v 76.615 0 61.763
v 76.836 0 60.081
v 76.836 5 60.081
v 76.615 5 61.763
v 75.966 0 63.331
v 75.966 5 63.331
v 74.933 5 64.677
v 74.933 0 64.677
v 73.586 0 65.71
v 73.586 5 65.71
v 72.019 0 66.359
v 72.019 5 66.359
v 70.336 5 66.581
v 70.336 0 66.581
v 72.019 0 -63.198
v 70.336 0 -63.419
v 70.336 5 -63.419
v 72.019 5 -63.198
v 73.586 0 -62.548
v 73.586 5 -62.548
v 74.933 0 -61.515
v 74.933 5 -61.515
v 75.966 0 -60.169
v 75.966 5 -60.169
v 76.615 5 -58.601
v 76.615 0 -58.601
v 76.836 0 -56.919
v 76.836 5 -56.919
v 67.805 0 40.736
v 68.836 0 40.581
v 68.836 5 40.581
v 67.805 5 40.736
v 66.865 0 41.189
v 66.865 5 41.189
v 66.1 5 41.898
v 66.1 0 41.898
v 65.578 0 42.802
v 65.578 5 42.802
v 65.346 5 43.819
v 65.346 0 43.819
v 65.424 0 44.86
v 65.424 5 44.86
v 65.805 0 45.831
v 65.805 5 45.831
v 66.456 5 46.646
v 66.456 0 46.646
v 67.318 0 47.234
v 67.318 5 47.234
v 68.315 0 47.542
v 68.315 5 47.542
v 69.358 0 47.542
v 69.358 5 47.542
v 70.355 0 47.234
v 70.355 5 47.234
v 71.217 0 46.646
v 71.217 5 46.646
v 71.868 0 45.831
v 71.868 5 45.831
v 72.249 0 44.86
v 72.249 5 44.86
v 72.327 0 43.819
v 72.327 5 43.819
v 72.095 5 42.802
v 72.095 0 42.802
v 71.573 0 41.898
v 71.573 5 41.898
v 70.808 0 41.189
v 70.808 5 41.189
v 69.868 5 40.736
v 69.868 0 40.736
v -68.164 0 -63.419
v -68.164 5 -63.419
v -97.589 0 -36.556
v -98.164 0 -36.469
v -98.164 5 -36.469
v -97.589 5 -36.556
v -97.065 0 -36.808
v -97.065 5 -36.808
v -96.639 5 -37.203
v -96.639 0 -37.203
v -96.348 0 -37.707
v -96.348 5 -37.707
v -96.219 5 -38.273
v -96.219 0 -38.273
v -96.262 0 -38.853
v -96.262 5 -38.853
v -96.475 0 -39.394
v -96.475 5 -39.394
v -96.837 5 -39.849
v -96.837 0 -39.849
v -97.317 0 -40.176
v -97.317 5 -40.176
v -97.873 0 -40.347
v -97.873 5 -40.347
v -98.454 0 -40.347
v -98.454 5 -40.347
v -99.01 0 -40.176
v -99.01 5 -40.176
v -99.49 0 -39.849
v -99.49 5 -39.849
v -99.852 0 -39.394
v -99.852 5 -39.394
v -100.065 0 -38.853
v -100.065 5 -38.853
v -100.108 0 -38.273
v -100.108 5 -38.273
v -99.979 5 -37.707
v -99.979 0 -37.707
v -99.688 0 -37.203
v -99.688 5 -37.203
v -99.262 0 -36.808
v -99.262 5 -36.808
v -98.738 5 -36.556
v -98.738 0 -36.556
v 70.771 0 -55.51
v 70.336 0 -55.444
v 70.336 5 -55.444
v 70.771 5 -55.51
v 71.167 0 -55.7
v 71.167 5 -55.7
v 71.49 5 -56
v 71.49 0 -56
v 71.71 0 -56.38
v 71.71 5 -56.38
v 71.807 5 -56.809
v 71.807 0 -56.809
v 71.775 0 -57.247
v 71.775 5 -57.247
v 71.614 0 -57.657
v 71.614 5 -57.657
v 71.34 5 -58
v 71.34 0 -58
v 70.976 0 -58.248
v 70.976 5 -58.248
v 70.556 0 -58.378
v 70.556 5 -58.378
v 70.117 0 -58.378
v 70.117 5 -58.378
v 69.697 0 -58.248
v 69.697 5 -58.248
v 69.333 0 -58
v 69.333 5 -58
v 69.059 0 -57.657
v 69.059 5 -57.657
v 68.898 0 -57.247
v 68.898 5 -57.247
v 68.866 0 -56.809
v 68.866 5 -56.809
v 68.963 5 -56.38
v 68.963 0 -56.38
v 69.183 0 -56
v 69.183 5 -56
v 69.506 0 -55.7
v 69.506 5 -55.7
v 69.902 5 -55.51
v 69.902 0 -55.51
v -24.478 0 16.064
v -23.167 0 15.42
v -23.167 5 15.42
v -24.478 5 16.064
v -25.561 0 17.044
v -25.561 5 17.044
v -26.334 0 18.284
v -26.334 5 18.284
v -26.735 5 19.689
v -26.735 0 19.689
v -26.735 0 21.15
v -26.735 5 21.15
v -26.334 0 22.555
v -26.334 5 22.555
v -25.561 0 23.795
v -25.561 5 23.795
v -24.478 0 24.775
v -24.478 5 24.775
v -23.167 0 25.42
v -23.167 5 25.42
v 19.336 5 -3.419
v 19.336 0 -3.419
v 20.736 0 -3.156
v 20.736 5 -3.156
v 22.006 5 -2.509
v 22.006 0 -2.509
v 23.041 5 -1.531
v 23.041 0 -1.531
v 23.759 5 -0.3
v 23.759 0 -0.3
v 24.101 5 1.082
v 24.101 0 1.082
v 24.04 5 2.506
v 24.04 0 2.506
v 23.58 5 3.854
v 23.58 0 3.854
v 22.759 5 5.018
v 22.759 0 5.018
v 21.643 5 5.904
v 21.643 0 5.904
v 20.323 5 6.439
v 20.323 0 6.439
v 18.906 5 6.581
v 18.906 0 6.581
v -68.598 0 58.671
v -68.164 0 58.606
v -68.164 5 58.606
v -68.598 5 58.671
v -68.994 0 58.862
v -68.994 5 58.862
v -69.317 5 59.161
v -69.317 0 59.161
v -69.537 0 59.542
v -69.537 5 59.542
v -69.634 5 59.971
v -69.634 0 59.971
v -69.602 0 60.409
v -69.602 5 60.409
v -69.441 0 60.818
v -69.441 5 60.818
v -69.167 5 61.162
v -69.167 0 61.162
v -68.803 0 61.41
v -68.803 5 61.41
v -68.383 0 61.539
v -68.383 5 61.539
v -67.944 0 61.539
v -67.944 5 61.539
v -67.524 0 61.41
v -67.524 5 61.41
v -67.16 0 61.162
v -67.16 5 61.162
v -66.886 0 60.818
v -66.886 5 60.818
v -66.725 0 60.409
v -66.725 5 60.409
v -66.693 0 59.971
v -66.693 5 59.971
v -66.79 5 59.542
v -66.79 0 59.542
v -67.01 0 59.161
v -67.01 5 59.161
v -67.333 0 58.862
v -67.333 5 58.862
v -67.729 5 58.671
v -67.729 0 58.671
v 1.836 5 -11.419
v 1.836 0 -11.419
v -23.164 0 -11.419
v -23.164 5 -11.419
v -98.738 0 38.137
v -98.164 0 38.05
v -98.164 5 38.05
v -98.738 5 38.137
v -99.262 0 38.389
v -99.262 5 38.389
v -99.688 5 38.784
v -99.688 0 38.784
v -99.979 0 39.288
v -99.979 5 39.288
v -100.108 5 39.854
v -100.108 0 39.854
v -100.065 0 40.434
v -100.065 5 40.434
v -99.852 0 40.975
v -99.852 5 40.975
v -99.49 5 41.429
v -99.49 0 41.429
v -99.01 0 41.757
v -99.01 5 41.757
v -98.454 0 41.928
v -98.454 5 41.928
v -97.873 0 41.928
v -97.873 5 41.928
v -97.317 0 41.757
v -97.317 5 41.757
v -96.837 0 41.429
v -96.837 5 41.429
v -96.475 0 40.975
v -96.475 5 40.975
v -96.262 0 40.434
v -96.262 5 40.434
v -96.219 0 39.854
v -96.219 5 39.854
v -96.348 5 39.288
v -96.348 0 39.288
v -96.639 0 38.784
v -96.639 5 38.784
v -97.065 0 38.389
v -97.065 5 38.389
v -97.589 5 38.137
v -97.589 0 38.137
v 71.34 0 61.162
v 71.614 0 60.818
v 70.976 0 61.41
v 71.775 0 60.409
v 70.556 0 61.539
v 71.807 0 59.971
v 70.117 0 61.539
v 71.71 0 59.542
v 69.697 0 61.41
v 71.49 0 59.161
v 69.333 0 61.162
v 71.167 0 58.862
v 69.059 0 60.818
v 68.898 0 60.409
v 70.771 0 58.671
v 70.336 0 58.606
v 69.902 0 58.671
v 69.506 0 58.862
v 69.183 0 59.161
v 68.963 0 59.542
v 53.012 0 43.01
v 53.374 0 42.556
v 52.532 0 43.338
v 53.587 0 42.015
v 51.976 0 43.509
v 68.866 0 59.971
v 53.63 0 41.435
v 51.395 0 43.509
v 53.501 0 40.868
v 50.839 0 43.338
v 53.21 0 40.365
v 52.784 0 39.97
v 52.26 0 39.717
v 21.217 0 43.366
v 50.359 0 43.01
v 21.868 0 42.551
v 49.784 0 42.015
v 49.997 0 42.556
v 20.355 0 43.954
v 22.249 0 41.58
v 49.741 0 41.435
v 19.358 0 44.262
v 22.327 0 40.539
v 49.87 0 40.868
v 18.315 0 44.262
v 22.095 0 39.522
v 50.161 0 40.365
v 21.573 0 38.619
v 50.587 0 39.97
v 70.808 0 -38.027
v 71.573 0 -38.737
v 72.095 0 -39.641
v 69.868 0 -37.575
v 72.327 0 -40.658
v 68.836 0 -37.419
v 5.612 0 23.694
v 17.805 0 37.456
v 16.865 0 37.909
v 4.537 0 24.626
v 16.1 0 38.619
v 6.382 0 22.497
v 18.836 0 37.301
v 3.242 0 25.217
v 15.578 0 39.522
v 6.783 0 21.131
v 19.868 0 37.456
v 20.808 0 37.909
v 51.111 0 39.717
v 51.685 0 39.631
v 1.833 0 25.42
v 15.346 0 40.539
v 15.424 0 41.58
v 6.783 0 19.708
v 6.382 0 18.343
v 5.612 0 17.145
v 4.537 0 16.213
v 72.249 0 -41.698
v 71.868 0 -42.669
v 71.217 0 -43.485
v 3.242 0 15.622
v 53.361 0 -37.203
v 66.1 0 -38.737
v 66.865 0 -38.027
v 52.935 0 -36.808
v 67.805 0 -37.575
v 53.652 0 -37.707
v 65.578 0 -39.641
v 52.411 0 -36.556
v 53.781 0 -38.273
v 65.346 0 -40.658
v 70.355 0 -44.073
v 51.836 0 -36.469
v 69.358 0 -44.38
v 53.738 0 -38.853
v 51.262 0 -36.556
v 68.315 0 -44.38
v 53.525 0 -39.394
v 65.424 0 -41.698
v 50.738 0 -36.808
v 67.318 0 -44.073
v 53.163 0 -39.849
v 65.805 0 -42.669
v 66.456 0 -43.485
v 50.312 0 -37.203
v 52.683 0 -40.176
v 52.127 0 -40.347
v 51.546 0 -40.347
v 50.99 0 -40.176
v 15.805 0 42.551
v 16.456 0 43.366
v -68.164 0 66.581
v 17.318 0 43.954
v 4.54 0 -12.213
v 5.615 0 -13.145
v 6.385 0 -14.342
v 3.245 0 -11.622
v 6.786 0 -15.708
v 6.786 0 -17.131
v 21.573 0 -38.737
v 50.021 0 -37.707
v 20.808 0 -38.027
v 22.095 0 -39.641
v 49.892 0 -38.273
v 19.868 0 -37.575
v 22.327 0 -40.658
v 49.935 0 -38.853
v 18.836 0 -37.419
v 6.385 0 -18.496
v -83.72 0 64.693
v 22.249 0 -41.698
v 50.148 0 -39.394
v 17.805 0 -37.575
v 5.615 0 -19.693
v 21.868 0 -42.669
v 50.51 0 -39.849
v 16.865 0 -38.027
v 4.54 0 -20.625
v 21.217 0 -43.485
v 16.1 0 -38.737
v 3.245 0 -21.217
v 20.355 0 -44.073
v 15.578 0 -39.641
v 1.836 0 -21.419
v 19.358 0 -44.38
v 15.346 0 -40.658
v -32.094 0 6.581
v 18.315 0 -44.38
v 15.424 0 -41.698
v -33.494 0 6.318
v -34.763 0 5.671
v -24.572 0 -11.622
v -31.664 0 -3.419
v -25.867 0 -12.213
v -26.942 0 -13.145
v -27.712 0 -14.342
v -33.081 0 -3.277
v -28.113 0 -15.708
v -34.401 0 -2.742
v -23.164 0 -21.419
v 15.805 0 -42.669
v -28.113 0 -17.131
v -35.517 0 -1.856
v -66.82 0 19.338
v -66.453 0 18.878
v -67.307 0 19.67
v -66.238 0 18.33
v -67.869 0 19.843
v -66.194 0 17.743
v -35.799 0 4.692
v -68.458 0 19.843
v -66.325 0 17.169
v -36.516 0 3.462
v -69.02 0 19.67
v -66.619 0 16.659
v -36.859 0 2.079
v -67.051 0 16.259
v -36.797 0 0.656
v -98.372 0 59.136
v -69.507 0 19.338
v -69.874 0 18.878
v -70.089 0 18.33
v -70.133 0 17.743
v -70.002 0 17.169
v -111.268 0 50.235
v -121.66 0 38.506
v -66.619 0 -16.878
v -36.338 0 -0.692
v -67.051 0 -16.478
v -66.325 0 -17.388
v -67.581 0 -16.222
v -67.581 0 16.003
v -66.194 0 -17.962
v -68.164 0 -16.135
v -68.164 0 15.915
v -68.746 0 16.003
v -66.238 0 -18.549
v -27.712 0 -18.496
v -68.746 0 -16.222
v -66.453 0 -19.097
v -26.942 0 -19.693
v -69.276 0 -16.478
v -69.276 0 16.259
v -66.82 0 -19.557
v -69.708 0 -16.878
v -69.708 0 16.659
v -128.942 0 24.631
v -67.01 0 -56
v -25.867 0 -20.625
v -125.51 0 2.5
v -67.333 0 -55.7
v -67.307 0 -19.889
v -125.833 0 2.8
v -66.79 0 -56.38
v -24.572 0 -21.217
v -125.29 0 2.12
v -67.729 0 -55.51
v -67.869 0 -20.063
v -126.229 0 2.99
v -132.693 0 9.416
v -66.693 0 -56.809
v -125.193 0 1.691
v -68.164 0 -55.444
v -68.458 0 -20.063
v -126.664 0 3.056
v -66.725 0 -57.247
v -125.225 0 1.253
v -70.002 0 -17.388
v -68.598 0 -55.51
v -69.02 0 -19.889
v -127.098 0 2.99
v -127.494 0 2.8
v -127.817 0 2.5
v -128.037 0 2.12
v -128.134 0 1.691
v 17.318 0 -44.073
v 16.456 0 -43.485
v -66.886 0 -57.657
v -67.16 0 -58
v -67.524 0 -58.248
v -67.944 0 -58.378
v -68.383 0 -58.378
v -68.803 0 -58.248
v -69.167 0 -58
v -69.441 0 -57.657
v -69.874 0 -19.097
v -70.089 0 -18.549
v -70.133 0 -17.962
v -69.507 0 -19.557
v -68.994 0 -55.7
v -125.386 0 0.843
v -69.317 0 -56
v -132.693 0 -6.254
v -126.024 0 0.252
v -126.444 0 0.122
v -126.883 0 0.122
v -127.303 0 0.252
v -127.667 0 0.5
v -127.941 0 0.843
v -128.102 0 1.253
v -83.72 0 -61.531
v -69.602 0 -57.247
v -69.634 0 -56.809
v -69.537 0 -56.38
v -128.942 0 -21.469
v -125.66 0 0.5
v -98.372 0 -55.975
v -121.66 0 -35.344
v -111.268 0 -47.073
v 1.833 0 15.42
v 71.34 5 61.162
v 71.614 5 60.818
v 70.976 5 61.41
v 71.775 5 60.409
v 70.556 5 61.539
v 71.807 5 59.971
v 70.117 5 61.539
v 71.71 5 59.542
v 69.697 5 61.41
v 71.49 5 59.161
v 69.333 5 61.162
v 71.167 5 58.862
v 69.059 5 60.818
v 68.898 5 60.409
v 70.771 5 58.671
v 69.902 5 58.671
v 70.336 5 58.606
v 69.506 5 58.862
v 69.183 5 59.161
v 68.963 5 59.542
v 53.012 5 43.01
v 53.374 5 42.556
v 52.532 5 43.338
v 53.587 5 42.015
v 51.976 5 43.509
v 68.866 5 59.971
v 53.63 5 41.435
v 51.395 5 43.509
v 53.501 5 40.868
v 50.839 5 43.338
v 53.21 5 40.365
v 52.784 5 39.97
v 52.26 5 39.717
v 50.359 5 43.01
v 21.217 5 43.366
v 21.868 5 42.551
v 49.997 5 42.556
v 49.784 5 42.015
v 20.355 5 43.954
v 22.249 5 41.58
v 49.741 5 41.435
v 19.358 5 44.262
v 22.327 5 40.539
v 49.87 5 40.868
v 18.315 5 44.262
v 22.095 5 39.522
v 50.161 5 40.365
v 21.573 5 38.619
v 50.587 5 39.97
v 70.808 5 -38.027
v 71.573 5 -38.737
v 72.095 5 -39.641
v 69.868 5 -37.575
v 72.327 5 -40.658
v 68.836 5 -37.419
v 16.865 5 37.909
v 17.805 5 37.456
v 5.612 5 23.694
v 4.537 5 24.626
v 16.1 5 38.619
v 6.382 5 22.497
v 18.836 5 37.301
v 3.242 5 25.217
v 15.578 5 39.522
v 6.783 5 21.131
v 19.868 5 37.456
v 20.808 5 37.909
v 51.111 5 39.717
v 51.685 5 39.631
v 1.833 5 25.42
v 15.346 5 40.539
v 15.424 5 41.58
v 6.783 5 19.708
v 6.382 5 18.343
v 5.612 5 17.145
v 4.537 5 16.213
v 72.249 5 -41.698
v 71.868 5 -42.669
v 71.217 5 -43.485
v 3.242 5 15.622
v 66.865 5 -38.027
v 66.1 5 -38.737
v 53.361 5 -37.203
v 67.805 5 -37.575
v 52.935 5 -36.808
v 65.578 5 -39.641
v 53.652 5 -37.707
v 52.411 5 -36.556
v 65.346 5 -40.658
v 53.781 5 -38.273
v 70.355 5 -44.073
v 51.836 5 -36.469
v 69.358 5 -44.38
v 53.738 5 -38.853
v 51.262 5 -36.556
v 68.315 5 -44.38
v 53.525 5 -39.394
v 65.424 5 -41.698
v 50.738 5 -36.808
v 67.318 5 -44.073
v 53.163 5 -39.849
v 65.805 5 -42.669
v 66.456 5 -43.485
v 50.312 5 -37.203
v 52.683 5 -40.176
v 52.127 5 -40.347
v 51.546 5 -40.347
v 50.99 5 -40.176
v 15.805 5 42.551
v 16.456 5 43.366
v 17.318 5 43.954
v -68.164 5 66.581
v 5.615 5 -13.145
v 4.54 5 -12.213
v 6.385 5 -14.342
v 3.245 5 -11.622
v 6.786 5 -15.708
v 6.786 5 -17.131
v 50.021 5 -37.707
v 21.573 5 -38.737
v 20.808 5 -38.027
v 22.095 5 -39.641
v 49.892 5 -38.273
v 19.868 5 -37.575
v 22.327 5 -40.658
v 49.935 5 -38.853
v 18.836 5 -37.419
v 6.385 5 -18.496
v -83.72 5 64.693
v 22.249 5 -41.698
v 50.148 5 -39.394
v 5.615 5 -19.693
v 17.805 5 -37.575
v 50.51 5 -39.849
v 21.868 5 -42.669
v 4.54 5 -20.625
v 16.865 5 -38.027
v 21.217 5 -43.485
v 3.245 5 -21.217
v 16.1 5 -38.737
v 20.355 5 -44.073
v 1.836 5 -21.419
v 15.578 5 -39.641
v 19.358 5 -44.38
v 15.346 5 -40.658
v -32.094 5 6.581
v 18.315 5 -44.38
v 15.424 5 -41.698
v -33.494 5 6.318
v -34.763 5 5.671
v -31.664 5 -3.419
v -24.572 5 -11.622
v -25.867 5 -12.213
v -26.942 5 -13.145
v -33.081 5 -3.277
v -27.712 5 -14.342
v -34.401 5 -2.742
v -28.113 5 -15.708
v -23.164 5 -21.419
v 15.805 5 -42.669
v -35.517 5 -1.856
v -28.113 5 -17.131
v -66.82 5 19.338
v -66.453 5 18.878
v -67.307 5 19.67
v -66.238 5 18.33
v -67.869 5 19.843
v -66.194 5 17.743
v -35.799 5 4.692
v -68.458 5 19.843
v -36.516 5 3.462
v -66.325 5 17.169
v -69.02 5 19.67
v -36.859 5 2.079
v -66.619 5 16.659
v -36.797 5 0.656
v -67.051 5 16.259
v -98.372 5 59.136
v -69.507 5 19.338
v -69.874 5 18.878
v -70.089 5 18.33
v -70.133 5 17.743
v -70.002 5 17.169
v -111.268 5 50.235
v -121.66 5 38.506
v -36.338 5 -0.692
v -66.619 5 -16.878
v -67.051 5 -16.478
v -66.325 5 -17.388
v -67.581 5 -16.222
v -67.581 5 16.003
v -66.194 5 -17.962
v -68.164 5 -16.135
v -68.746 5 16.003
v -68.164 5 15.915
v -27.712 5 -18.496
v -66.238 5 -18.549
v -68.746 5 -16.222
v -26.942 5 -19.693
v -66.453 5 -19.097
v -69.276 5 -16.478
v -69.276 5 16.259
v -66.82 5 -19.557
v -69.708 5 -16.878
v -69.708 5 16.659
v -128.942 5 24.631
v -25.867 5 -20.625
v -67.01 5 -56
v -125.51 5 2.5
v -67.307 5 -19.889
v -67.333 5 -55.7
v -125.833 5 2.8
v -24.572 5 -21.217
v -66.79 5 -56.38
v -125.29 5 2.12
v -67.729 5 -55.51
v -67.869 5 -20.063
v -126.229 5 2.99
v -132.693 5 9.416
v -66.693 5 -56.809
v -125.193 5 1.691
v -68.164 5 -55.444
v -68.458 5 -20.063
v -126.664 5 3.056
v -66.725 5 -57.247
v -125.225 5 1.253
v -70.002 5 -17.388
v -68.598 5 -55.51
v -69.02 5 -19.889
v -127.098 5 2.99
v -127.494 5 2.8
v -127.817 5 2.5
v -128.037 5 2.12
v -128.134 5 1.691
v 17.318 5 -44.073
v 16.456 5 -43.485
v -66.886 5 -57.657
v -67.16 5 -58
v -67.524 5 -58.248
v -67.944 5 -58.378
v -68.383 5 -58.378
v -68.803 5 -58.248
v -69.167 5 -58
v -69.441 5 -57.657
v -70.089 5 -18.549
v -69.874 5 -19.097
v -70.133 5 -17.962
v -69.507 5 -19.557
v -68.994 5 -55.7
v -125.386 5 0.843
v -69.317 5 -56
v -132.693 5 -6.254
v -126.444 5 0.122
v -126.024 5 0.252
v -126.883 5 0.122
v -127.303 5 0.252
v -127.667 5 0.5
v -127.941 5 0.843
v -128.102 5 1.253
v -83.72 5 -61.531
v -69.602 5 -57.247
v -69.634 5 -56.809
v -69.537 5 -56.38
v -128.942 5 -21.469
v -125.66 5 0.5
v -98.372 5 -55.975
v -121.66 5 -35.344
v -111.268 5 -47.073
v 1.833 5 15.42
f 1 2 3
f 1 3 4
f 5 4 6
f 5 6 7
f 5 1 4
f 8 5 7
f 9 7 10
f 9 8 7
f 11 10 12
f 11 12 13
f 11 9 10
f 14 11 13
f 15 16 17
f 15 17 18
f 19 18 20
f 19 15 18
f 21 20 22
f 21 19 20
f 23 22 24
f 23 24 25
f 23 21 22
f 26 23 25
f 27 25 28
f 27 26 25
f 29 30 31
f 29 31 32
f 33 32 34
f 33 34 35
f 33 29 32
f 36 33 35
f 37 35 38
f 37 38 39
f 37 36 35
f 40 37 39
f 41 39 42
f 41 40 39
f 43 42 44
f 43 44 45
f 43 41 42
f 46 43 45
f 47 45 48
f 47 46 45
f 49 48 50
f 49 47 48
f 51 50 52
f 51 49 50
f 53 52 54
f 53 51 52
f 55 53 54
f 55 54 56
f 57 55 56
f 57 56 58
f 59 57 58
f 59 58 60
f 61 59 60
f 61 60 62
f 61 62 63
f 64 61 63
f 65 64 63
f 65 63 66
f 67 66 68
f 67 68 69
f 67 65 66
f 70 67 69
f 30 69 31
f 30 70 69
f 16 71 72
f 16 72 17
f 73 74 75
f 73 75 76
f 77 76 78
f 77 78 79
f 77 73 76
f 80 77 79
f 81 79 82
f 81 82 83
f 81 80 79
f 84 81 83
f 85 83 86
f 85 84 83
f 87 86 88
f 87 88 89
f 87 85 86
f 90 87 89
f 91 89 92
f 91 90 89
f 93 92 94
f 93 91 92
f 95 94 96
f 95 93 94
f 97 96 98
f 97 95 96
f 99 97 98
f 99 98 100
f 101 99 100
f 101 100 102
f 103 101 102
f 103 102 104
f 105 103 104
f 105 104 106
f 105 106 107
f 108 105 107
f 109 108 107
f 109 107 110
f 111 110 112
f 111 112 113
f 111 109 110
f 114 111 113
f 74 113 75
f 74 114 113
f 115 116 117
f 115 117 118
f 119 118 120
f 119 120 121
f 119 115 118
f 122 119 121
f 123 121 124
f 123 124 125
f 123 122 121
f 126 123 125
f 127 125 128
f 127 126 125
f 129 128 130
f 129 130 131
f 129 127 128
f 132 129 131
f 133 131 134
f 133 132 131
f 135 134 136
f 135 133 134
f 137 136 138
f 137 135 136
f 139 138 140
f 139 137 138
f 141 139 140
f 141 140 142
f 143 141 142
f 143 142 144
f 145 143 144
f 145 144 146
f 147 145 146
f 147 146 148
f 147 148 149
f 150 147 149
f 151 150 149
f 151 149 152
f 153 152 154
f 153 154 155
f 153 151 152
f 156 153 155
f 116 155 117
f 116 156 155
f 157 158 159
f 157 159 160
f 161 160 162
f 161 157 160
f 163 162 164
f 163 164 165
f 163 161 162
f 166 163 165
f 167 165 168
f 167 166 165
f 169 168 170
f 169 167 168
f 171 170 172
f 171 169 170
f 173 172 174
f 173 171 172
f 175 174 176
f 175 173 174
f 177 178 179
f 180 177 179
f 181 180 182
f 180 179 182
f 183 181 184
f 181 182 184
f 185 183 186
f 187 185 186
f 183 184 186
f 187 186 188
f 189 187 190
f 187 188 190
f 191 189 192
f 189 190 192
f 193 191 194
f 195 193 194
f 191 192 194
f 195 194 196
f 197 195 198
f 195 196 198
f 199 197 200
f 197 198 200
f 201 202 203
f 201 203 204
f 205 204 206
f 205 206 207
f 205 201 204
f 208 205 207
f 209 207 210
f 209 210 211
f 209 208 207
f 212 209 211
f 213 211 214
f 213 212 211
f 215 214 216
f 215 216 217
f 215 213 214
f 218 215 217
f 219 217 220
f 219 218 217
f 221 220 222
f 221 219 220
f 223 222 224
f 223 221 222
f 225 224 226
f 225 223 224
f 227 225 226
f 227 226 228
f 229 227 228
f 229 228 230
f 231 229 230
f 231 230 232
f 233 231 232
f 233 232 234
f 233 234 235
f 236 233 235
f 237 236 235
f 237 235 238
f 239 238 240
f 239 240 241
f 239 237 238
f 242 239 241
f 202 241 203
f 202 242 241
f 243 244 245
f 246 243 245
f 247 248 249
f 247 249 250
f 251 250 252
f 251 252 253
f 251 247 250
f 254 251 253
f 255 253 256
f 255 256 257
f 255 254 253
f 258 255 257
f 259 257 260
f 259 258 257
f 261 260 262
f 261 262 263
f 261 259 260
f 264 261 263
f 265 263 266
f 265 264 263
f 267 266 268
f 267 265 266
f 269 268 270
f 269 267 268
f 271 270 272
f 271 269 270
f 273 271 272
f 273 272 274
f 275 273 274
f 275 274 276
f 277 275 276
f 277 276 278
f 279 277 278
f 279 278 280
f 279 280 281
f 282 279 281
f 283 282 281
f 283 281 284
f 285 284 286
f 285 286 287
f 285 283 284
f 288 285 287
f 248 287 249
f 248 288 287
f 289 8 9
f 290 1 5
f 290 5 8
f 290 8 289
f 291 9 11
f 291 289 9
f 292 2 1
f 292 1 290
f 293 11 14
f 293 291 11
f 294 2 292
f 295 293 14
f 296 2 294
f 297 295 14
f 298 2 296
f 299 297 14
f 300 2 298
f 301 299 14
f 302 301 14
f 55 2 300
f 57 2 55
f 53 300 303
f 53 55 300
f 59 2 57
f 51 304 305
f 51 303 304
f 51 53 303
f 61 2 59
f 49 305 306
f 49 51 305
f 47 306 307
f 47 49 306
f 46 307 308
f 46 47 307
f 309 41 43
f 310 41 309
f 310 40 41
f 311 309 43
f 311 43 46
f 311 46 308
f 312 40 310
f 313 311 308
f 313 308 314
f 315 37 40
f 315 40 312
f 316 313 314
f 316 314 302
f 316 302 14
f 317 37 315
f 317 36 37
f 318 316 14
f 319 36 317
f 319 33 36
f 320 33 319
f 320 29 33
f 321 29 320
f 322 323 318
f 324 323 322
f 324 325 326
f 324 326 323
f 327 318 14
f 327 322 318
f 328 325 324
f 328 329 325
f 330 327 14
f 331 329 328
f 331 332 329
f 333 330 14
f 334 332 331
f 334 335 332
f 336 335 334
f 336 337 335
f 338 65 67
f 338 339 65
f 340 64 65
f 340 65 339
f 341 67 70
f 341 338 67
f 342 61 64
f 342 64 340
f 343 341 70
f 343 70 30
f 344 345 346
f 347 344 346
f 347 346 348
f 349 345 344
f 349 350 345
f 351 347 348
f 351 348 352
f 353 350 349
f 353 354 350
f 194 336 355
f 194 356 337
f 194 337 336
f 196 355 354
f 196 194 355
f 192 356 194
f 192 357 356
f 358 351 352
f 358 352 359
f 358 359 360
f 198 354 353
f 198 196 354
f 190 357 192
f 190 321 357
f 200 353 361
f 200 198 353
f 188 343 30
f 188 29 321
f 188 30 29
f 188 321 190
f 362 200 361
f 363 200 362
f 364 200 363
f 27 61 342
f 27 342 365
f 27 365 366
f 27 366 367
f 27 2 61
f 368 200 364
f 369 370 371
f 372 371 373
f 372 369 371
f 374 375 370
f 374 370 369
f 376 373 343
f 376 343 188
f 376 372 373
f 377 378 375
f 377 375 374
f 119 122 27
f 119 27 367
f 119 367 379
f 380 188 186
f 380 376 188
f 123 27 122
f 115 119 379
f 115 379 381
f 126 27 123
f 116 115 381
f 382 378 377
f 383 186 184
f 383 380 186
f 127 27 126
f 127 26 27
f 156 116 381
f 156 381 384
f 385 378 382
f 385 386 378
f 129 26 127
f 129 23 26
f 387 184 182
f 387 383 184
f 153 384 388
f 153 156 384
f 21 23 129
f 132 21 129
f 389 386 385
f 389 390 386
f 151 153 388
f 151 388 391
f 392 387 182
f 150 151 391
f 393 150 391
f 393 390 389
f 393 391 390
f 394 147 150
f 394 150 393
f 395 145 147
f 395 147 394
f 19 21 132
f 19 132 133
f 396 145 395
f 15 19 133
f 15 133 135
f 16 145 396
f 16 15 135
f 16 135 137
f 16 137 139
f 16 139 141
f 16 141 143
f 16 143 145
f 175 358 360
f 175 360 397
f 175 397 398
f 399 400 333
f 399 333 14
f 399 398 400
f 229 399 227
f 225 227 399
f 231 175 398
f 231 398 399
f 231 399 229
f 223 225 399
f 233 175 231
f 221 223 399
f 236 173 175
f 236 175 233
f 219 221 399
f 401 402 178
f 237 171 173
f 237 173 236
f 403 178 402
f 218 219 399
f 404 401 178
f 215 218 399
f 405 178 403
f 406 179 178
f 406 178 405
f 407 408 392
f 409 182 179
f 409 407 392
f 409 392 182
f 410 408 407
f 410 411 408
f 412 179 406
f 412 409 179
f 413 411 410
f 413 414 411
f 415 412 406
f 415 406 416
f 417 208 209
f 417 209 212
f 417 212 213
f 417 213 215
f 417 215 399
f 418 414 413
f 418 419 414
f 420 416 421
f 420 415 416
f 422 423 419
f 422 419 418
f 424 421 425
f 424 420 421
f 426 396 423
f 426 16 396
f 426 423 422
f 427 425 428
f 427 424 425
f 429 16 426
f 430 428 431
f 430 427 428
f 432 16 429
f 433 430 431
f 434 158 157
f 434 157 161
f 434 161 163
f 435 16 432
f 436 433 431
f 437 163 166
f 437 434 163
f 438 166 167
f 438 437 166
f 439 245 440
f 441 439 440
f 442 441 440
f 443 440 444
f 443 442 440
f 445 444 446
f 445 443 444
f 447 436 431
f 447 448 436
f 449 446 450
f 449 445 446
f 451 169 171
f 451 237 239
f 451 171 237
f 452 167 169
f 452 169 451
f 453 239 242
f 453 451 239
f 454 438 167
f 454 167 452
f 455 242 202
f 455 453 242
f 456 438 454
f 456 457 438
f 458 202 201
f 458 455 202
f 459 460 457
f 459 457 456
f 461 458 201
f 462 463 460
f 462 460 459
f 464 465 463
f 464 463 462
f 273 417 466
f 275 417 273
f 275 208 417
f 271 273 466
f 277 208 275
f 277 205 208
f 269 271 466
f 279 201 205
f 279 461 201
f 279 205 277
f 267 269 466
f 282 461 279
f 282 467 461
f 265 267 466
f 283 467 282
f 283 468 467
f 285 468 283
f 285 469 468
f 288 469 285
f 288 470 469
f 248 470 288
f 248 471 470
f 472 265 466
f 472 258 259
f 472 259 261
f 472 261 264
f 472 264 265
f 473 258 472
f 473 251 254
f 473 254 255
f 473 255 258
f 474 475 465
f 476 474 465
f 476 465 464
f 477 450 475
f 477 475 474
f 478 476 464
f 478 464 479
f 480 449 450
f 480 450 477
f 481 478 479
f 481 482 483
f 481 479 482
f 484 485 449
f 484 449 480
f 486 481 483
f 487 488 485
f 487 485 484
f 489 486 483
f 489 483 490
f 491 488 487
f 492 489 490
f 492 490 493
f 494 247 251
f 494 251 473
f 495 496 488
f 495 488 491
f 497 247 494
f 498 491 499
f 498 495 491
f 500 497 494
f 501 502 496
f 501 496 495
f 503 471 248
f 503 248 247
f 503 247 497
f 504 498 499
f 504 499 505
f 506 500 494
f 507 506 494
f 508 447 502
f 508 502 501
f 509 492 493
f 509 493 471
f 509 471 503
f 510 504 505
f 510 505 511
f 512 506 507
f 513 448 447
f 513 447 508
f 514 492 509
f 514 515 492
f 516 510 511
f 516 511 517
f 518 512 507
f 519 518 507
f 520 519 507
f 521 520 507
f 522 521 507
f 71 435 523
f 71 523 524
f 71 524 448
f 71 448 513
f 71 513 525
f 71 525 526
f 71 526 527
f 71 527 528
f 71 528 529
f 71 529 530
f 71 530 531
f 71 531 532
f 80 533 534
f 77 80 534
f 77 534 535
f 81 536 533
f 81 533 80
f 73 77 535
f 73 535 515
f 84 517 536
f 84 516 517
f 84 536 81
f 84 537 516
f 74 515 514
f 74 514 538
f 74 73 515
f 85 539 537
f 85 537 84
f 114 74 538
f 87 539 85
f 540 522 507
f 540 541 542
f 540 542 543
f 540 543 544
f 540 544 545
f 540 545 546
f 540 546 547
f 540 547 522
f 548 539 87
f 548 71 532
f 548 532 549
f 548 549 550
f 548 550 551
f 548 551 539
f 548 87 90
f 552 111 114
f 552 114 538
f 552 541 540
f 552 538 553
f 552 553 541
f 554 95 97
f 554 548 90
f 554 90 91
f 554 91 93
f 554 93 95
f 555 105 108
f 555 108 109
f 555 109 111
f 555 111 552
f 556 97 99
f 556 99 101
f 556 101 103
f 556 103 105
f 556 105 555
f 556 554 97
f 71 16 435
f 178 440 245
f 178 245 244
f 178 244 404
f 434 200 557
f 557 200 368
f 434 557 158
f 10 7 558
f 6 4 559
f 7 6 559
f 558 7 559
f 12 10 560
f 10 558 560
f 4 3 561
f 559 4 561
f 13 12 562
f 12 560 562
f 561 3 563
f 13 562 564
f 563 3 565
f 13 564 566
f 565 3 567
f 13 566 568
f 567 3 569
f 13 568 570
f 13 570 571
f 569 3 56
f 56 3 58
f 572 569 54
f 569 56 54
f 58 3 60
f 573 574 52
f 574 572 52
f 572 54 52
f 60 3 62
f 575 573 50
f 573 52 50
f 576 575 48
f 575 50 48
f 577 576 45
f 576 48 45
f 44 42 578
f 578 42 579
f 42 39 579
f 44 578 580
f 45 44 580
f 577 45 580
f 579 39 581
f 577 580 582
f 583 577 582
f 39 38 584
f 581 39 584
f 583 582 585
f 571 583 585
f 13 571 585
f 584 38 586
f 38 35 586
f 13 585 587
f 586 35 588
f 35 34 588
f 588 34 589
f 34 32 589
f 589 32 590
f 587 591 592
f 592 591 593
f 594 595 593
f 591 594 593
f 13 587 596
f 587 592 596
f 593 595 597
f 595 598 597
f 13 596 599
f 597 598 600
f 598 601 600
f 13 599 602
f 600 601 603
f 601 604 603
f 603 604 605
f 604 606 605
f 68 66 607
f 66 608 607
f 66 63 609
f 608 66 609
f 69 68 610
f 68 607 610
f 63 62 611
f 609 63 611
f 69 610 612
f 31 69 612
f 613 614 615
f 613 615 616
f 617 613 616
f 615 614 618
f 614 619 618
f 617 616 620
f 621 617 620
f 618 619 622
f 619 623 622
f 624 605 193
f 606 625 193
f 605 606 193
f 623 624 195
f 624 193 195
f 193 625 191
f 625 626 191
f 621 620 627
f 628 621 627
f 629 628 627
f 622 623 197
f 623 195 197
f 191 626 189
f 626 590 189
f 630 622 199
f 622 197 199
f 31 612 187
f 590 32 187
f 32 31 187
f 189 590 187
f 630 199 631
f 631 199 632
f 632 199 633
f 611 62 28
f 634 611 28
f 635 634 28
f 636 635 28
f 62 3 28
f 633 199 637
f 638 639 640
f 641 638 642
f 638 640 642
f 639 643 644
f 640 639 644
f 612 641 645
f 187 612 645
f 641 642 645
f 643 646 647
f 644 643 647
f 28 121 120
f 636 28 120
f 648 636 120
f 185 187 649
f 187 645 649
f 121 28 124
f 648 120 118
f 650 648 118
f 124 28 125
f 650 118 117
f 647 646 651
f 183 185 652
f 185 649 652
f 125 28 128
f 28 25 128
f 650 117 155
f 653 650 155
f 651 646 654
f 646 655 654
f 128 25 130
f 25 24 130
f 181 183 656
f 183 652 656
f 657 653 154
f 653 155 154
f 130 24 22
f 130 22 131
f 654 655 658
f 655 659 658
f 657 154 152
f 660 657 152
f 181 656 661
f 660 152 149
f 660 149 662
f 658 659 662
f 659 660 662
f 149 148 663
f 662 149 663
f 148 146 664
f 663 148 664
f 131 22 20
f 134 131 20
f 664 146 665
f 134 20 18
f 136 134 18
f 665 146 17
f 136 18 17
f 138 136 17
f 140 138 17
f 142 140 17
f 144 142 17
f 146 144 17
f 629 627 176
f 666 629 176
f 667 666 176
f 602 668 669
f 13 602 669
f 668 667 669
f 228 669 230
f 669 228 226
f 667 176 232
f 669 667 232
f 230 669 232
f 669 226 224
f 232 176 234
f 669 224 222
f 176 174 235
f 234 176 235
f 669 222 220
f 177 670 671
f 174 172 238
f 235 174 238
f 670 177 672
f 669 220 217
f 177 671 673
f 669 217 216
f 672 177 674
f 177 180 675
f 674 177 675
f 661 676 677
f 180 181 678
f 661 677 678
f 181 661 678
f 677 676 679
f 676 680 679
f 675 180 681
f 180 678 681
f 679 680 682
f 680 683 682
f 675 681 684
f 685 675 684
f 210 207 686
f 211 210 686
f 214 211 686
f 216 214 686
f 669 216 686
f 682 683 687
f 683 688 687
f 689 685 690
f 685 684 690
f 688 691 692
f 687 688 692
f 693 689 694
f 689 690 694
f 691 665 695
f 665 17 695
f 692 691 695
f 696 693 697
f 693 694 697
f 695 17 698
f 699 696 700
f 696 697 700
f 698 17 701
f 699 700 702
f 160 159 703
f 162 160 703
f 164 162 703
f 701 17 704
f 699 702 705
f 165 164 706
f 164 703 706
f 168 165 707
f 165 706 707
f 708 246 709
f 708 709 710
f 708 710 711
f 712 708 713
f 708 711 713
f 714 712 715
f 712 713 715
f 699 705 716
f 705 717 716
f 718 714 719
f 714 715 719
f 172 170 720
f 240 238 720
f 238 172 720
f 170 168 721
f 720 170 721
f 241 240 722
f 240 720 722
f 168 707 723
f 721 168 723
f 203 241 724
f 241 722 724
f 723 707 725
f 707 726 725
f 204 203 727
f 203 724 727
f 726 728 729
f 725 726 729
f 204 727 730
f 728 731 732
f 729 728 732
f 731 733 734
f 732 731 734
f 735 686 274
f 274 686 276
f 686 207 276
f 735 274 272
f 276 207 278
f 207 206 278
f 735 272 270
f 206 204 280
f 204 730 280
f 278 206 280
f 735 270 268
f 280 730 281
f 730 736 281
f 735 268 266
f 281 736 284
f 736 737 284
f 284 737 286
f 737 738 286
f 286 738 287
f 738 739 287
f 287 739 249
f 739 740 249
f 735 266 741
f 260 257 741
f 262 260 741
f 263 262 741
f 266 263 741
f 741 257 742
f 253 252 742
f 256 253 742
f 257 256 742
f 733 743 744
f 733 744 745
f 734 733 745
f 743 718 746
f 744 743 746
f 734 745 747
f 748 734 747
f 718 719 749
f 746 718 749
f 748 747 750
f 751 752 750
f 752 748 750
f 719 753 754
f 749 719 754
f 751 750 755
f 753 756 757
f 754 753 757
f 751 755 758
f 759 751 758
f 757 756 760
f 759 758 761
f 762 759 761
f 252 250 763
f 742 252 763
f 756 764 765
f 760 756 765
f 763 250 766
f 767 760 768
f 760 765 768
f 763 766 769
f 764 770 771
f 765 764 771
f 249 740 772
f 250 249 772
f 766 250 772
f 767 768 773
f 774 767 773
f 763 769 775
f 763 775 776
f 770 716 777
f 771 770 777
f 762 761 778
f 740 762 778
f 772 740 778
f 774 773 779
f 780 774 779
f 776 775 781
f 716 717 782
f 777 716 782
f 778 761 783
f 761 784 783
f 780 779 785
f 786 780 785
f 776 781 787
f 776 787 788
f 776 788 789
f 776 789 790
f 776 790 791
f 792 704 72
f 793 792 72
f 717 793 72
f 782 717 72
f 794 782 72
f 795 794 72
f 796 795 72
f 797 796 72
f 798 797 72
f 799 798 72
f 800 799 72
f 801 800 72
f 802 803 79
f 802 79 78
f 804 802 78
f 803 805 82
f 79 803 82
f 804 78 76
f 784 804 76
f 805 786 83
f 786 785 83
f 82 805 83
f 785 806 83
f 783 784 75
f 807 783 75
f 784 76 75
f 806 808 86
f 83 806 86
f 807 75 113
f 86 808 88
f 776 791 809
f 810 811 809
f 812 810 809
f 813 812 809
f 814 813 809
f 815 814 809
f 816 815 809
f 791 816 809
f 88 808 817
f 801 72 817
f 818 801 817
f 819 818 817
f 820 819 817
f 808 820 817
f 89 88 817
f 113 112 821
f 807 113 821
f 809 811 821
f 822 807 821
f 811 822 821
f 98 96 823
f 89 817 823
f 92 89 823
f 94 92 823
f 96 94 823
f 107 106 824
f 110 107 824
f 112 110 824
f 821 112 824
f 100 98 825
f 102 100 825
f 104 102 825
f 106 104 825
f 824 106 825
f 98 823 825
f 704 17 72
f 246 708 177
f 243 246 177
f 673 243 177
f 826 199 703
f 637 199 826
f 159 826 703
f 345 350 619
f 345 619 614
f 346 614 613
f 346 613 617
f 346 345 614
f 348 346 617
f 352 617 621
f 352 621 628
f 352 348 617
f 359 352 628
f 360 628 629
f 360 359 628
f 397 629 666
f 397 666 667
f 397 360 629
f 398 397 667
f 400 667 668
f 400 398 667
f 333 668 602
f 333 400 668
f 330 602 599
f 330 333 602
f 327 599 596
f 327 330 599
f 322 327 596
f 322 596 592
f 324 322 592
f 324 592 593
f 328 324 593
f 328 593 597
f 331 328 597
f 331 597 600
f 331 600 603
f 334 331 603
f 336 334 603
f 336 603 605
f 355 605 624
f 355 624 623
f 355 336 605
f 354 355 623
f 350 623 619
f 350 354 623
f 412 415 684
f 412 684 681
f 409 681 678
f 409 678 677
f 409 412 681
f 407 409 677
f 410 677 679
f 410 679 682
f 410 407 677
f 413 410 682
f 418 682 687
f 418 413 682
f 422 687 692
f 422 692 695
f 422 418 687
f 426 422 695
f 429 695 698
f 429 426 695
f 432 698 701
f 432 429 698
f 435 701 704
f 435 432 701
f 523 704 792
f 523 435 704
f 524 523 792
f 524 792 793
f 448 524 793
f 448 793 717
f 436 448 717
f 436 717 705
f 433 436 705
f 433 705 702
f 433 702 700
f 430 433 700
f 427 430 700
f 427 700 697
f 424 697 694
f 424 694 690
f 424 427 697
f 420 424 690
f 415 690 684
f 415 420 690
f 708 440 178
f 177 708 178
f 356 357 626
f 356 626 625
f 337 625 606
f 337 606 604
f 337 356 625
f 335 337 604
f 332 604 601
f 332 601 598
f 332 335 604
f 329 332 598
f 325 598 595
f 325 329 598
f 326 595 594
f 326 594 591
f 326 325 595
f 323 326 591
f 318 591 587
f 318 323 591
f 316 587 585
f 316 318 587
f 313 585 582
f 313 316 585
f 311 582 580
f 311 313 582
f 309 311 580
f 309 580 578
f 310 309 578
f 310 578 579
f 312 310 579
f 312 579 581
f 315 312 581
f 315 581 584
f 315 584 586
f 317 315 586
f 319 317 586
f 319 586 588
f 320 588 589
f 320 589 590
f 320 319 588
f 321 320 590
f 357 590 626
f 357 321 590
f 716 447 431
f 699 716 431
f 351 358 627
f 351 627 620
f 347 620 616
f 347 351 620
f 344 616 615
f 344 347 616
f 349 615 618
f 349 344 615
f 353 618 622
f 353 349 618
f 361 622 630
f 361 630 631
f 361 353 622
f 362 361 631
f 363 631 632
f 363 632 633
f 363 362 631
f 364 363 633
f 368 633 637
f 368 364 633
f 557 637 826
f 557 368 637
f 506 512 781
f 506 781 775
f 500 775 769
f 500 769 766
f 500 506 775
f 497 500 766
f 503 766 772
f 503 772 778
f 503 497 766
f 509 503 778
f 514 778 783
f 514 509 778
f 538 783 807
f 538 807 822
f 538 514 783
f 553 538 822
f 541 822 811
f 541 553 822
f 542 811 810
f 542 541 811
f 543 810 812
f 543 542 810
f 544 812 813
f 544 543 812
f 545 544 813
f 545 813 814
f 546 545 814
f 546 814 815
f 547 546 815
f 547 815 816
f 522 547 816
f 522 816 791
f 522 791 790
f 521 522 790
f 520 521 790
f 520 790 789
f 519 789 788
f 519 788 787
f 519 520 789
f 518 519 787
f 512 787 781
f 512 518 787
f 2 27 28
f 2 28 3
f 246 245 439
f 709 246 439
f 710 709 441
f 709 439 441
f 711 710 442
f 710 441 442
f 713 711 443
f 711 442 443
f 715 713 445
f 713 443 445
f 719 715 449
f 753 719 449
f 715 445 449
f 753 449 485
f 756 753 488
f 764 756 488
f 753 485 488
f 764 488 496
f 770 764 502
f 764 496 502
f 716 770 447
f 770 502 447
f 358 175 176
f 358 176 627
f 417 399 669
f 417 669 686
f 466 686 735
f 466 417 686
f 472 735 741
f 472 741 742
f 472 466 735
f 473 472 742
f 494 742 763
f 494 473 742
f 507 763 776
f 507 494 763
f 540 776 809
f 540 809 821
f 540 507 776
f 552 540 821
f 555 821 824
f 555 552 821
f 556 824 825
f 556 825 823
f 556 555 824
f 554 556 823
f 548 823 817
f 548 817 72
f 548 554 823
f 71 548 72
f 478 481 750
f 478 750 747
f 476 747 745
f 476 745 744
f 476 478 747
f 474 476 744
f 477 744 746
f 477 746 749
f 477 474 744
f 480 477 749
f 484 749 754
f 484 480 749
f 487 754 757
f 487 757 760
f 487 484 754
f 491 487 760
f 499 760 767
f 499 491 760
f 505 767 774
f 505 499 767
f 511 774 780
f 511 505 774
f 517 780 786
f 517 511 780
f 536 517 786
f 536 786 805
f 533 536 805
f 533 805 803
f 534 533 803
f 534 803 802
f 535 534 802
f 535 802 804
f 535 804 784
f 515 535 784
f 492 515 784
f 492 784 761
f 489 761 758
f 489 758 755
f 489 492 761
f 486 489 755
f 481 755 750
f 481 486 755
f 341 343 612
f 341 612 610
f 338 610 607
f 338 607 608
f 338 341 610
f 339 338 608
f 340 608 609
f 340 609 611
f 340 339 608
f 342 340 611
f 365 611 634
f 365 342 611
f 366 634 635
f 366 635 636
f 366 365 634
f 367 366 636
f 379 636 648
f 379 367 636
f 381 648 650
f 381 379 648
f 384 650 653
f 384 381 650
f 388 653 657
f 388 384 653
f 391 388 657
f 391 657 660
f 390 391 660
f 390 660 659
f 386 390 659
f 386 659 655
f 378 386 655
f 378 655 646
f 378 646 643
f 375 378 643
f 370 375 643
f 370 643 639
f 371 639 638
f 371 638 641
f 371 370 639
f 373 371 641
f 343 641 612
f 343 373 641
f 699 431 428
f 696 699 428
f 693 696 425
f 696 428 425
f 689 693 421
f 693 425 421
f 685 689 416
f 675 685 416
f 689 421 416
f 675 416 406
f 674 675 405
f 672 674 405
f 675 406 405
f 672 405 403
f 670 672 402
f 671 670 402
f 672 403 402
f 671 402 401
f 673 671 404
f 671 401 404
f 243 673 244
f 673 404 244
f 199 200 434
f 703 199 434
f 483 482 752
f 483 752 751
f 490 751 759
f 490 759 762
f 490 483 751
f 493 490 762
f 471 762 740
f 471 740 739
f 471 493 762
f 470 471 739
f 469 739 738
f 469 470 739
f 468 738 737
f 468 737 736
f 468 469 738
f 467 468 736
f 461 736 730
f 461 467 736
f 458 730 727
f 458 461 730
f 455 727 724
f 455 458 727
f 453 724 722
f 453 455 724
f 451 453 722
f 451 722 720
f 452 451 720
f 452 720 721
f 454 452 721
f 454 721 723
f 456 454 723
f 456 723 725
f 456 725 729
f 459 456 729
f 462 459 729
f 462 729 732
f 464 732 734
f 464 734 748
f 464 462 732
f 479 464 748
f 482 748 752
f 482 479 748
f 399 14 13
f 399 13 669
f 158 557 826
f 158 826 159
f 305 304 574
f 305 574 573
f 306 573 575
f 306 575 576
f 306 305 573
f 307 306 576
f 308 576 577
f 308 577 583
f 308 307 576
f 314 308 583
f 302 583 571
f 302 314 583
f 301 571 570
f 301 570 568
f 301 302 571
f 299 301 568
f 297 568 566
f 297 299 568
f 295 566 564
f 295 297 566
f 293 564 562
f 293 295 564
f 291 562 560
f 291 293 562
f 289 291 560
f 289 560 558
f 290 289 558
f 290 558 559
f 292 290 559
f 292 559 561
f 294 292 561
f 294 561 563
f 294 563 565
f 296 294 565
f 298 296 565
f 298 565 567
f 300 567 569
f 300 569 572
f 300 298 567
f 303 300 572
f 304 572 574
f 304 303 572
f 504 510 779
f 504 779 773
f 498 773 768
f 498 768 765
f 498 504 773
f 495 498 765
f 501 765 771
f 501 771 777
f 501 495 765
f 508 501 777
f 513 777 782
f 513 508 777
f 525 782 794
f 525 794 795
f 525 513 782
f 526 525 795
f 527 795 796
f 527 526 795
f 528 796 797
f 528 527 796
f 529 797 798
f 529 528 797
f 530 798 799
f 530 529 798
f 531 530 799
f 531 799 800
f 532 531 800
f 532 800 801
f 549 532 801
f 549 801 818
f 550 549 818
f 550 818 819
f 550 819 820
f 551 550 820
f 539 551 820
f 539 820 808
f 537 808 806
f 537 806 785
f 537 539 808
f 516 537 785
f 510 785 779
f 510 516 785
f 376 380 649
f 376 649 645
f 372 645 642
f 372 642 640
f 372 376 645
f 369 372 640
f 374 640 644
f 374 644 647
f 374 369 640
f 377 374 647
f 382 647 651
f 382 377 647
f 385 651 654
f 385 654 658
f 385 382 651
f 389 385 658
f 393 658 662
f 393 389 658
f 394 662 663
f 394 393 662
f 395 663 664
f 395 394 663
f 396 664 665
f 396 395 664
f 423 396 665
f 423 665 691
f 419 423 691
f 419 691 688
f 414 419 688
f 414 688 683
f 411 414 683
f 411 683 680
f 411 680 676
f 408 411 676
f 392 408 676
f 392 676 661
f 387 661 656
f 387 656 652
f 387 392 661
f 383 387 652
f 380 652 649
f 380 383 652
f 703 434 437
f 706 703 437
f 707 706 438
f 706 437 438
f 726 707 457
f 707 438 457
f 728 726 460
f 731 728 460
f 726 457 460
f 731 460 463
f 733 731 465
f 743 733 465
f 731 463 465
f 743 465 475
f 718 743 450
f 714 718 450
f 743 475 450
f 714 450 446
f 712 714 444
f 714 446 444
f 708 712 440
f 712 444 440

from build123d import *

# Parameters (mm, degrees)
SKETCH1_R           = 3.5
SKETCH1_R_2         = 1.95
SKETCH1_R_3         = 1.475
SKETCH1_R_4         = 1.975
BOSS_EXTRUDE2_DEPTH = 5


with BuildPart() as part:
    # Sketch1 → Boss-Extrude2 (new body)
    with BuildSketch(Plane(origin=(0, 0, 0), x_dir=(1, 0, 0), z_dir=(0, 1, 0))):
        with BuildLine():
            Line((76.836482479, 56.919157308), (76.836482479, -60.080842545))
            ThreePointArc((76.836482479, -60.080842545), (74.932676609, -64.677036718), (70.336482479, -66.580842692))
            Line((70.336482479, -66.580842692), (-68.163517521, -66.580842545))
            ThreePointArc((-68.163517521, -66.580842545), (-133.166606879, -1.580842619), (-68.163517521, 63.419157308))
            Line((-68.163517521, 63.419157308), (70.336482479, 63.419157308))
            ThreePointArc((70.336482479, 63.419157308), (74.932676557, 61.515351386), (76.836482479, 56.919157308))
        make_face()
        with Locations(Location((18.836482479, 40.919291459, 0), (0, 0, 270))):
            Circle(SKETCH1_R, mode=Mode.SUBTRACT)
        with Locations(Location((51.836482479, 38.419157308, 0), (0, 0, 270))):
            Circle(SKETCH1_R_2, mode=Mode.SUBTRACT)
        with Locations(Location((68.836482479, 40.919291459, 0), (0, 0, 270))):
            Circle(SKETCH1_R, mode=Mode.SUBTRACT)
        with Locations(Location((70.336482479, 56.919157308, 0), (0, 0, 270))):
            Circle(SKETCH1_R_3, mode=Mode.SUBTRACT)
        with Locations(Location((18.836482479, -40.800748124, 0), (0, 0, 90))):
            Circle(SKETCH1_R, mode=Mode.SUBTRACT)
        with Locations(Location((70.336482479, -60.080842692, 0), (0, 0, 90))):
            Circle(SKETCH1_R_3, mode=Mode.SUBTRACT)
        with Locations(Location((51.685487167, -41.580700194, 0), (0, 0, 90))):
            Circle(SKETCH1_R_2, mode=Mode.SUBTRACT)
        with Locations(Location((68.836482479, -44.080708541, 0), (0, 0, 90))):
            Circle(SKETCH1_R, mode=Mode.SUBTRACT)
        with Locations(Location((-68.163517521, 56.919157308, 0), (0, 0, 270))):
            Circle(SKETCH1_R_3, mode=Mode.SUBTRACT)
        with Locations(Location((-98.163517521, 38.419157308, 0), (0, 0, 270))):
            Circle(SKETCH1_R_2, mode=Mode.SUBTRACT)
        with Locations(Location((-68.163517521, 18.109648094, 0), (0, 0, 270))):
            Circle(SKETCH1_R_4, mode=Mode.SUBTRACT)
        with Locations(Location((-68.163517521, -17.890351906, 0), (0, 0, 90))):
            Circle(SKETCH1_R_4, mode=Mode.SUBTRACT)
        with Locations(Location((-98.163517521, -40.000000036, 0), (0, 0, 90))):
            Circle(SKETCH1_R_2, mode=Mode.SUBTRACT)
        with Locations(Location((-68.163517521, -60.080842545, 0), (0, 0, 90))):
            Circle(SKETCH1_R_3, mode=Mode.SUBTRACT)
        with Locations(Location((-126.663517521, -1.580842619, 0), (0, 0, 270))):
            Circle(SKETCH1_R_3, mode=Mode.SUBTRACT)
        with BuildLine():
            Line((-31.663517521, 3.419157346), (19.336482479, 3.419157346))
            ThreePointArc((19.336482479, 3.419157346), (24.121172968, -1.796152166), (18.905863456, -6.580842654))
            Line((18.905863456, -6.580842654), (-32.094136544, -6.580842654))
            ThreePointArc((-32.094136544, -6.580842654), (-36.878827032, -1.365533142), (-31.663517521, 3.419157346))
        make_face(mode=Mode.SUBTRACT)
        with BuildLine():
            Line((-23.163517274, 21.419157346), (1.836482479, 21.419157346))
            ThreePointArc((1.836482479, 21.419157346), (6.836482479, 16.419157346), (1.836482479, 11.419157346))
            Line((1.836482479, 11.419157346), (-23.163517274, 11.419157346))
            ThreePointArc((-23.163517274, 11.419157346), (-28.163517274, 16.419157346), (-23.163517274, 21.419157346))
        make_face(mode=Mode.SUBTRACT)
        with BuildLine():
            Line((-23.166606879, -25.419653269), (1.833393121, -25.419653269))
            ThreePointArc((1.833393121, -25.419653269), (6.833393121, -20.419653269), (1.833393121, -15.419653269))
            Line((1.833393121, -15.419653269), (-23.166606879, -15.419653269))
            ThreePointArc((-23.166606879, -15.419653269), (-26.786365539, -20.419653269), (-23.166606879, -25.419653269))
        make_face(mode=Mode.SUBTRACT)
    extrude(amount=BOSS_EXTRUDE2_DEPTH)


solid = part.part
